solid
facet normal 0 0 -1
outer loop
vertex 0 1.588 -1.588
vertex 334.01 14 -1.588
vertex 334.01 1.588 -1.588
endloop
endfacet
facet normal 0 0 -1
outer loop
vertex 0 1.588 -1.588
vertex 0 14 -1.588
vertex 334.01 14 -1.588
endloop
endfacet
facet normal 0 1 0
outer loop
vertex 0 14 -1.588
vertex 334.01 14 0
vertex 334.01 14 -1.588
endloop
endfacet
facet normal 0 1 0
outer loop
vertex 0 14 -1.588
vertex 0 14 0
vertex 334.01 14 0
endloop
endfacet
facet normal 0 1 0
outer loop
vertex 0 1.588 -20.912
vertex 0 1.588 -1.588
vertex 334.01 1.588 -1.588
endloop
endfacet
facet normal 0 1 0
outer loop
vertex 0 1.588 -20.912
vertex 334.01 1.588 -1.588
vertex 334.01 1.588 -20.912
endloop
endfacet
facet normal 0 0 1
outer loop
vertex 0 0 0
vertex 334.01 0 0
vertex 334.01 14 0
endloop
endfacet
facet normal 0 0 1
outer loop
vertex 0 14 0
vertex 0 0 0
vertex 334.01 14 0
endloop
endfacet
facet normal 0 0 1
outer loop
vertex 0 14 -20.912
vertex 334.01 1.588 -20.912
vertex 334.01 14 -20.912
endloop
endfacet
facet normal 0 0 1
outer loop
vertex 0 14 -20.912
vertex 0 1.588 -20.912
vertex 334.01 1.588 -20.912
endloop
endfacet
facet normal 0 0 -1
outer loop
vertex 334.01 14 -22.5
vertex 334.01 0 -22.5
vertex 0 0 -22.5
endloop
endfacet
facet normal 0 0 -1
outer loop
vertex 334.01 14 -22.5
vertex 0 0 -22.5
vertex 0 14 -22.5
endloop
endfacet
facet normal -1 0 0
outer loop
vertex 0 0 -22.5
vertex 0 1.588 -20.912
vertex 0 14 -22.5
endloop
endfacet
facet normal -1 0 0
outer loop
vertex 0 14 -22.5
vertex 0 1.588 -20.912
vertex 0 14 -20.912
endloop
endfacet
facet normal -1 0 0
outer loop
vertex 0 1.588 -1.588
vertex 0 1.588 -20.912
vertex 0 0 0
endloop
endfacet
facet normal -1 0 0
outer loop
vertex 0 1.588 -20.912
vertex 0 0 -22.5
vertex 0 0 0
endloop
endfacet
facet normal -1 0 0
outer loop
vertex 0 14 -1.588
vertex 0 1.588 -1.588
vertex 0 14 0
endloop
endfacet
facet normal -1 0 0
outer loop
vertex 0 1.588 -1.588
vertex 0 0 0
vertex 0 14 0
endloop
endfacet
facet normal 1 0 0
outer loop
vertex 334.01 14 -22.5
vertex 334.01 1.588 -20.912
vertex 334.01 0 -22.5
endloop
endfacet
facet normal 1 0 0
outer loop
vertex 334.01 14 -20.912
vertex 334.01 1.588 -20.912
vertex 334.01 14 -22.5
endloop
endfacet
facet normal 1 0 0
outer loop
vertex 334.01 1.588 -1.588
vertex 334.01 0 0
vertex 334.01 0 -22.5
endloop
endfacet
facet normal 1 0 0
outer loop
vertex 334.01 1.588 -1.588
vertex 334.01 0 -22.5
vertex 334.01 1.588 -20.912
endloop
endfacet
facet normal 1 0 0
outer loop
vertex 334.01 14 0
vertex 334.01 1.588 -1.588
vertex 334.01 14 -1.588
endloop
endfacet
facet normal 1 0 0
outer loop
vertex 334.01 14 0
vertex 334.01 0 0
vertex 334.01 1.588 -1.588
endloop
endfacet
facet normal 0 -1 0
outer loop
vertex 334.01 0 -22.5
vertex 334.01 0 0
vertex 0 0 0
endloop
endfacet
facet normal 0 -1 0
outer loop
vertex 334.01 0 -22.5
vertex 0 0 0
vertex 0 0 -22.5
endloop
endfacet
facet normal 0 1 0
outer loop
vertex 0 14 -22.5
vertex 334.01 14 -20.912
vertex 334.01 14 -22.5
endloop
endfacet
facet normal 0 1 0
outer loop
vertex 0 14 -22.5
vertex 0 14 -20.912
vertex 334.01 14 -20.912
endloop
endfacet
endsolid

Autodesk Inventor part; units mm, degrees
ref_plane "YZ Plane" through (0, 0, 0) normal (1, 0, 0) x (0, 1, 0)
ref_plane "XZ Plane" through (0, 0, 0) normal (0, 1, 0) x (-1, 0, 0)
ref_plane "XY Plane" through (0, 0, 0) normal (0, 0, 1) x (1, 0, 0)
sketch "Sketch1" plane through (0, 0, 0) normal (1, 0, 0) x (0, 1, 0)
  point P0 (0, 0)
sketch "Sketch2" plane through (0, 0, 0) normal (1, 0, 0) x (0, 1, 0)
  line L0 (0, 0) -> (0, -22.5)
  line L1 (0, 0) -> (14, 0)
  line L2 (0, -22.5) -> (14, -22.5)
  line L3 (14, 0) -> (14, -1.588)
  line L4 (14, -1.588) -> (1.588, -1.588)
  line L5 (1.588, -1.588) -> (1.588, -20.912)
  line L6 (1.588, -20.912) -> (14, -20.912)
  line L7 (14, -20.912) -> (14, -22.5)
  dimension "d0" = 22.5
  dimension "d1" = 14
  dimension "d2" = 14
  dimension "d3" = 1.588
  dimension "d4" = 12.412
  dimension "d5" = 19.324
extrude "Extrusion1" add sketch "Sketch2" along normal blind 334.01
properties part number "alCchannel"
